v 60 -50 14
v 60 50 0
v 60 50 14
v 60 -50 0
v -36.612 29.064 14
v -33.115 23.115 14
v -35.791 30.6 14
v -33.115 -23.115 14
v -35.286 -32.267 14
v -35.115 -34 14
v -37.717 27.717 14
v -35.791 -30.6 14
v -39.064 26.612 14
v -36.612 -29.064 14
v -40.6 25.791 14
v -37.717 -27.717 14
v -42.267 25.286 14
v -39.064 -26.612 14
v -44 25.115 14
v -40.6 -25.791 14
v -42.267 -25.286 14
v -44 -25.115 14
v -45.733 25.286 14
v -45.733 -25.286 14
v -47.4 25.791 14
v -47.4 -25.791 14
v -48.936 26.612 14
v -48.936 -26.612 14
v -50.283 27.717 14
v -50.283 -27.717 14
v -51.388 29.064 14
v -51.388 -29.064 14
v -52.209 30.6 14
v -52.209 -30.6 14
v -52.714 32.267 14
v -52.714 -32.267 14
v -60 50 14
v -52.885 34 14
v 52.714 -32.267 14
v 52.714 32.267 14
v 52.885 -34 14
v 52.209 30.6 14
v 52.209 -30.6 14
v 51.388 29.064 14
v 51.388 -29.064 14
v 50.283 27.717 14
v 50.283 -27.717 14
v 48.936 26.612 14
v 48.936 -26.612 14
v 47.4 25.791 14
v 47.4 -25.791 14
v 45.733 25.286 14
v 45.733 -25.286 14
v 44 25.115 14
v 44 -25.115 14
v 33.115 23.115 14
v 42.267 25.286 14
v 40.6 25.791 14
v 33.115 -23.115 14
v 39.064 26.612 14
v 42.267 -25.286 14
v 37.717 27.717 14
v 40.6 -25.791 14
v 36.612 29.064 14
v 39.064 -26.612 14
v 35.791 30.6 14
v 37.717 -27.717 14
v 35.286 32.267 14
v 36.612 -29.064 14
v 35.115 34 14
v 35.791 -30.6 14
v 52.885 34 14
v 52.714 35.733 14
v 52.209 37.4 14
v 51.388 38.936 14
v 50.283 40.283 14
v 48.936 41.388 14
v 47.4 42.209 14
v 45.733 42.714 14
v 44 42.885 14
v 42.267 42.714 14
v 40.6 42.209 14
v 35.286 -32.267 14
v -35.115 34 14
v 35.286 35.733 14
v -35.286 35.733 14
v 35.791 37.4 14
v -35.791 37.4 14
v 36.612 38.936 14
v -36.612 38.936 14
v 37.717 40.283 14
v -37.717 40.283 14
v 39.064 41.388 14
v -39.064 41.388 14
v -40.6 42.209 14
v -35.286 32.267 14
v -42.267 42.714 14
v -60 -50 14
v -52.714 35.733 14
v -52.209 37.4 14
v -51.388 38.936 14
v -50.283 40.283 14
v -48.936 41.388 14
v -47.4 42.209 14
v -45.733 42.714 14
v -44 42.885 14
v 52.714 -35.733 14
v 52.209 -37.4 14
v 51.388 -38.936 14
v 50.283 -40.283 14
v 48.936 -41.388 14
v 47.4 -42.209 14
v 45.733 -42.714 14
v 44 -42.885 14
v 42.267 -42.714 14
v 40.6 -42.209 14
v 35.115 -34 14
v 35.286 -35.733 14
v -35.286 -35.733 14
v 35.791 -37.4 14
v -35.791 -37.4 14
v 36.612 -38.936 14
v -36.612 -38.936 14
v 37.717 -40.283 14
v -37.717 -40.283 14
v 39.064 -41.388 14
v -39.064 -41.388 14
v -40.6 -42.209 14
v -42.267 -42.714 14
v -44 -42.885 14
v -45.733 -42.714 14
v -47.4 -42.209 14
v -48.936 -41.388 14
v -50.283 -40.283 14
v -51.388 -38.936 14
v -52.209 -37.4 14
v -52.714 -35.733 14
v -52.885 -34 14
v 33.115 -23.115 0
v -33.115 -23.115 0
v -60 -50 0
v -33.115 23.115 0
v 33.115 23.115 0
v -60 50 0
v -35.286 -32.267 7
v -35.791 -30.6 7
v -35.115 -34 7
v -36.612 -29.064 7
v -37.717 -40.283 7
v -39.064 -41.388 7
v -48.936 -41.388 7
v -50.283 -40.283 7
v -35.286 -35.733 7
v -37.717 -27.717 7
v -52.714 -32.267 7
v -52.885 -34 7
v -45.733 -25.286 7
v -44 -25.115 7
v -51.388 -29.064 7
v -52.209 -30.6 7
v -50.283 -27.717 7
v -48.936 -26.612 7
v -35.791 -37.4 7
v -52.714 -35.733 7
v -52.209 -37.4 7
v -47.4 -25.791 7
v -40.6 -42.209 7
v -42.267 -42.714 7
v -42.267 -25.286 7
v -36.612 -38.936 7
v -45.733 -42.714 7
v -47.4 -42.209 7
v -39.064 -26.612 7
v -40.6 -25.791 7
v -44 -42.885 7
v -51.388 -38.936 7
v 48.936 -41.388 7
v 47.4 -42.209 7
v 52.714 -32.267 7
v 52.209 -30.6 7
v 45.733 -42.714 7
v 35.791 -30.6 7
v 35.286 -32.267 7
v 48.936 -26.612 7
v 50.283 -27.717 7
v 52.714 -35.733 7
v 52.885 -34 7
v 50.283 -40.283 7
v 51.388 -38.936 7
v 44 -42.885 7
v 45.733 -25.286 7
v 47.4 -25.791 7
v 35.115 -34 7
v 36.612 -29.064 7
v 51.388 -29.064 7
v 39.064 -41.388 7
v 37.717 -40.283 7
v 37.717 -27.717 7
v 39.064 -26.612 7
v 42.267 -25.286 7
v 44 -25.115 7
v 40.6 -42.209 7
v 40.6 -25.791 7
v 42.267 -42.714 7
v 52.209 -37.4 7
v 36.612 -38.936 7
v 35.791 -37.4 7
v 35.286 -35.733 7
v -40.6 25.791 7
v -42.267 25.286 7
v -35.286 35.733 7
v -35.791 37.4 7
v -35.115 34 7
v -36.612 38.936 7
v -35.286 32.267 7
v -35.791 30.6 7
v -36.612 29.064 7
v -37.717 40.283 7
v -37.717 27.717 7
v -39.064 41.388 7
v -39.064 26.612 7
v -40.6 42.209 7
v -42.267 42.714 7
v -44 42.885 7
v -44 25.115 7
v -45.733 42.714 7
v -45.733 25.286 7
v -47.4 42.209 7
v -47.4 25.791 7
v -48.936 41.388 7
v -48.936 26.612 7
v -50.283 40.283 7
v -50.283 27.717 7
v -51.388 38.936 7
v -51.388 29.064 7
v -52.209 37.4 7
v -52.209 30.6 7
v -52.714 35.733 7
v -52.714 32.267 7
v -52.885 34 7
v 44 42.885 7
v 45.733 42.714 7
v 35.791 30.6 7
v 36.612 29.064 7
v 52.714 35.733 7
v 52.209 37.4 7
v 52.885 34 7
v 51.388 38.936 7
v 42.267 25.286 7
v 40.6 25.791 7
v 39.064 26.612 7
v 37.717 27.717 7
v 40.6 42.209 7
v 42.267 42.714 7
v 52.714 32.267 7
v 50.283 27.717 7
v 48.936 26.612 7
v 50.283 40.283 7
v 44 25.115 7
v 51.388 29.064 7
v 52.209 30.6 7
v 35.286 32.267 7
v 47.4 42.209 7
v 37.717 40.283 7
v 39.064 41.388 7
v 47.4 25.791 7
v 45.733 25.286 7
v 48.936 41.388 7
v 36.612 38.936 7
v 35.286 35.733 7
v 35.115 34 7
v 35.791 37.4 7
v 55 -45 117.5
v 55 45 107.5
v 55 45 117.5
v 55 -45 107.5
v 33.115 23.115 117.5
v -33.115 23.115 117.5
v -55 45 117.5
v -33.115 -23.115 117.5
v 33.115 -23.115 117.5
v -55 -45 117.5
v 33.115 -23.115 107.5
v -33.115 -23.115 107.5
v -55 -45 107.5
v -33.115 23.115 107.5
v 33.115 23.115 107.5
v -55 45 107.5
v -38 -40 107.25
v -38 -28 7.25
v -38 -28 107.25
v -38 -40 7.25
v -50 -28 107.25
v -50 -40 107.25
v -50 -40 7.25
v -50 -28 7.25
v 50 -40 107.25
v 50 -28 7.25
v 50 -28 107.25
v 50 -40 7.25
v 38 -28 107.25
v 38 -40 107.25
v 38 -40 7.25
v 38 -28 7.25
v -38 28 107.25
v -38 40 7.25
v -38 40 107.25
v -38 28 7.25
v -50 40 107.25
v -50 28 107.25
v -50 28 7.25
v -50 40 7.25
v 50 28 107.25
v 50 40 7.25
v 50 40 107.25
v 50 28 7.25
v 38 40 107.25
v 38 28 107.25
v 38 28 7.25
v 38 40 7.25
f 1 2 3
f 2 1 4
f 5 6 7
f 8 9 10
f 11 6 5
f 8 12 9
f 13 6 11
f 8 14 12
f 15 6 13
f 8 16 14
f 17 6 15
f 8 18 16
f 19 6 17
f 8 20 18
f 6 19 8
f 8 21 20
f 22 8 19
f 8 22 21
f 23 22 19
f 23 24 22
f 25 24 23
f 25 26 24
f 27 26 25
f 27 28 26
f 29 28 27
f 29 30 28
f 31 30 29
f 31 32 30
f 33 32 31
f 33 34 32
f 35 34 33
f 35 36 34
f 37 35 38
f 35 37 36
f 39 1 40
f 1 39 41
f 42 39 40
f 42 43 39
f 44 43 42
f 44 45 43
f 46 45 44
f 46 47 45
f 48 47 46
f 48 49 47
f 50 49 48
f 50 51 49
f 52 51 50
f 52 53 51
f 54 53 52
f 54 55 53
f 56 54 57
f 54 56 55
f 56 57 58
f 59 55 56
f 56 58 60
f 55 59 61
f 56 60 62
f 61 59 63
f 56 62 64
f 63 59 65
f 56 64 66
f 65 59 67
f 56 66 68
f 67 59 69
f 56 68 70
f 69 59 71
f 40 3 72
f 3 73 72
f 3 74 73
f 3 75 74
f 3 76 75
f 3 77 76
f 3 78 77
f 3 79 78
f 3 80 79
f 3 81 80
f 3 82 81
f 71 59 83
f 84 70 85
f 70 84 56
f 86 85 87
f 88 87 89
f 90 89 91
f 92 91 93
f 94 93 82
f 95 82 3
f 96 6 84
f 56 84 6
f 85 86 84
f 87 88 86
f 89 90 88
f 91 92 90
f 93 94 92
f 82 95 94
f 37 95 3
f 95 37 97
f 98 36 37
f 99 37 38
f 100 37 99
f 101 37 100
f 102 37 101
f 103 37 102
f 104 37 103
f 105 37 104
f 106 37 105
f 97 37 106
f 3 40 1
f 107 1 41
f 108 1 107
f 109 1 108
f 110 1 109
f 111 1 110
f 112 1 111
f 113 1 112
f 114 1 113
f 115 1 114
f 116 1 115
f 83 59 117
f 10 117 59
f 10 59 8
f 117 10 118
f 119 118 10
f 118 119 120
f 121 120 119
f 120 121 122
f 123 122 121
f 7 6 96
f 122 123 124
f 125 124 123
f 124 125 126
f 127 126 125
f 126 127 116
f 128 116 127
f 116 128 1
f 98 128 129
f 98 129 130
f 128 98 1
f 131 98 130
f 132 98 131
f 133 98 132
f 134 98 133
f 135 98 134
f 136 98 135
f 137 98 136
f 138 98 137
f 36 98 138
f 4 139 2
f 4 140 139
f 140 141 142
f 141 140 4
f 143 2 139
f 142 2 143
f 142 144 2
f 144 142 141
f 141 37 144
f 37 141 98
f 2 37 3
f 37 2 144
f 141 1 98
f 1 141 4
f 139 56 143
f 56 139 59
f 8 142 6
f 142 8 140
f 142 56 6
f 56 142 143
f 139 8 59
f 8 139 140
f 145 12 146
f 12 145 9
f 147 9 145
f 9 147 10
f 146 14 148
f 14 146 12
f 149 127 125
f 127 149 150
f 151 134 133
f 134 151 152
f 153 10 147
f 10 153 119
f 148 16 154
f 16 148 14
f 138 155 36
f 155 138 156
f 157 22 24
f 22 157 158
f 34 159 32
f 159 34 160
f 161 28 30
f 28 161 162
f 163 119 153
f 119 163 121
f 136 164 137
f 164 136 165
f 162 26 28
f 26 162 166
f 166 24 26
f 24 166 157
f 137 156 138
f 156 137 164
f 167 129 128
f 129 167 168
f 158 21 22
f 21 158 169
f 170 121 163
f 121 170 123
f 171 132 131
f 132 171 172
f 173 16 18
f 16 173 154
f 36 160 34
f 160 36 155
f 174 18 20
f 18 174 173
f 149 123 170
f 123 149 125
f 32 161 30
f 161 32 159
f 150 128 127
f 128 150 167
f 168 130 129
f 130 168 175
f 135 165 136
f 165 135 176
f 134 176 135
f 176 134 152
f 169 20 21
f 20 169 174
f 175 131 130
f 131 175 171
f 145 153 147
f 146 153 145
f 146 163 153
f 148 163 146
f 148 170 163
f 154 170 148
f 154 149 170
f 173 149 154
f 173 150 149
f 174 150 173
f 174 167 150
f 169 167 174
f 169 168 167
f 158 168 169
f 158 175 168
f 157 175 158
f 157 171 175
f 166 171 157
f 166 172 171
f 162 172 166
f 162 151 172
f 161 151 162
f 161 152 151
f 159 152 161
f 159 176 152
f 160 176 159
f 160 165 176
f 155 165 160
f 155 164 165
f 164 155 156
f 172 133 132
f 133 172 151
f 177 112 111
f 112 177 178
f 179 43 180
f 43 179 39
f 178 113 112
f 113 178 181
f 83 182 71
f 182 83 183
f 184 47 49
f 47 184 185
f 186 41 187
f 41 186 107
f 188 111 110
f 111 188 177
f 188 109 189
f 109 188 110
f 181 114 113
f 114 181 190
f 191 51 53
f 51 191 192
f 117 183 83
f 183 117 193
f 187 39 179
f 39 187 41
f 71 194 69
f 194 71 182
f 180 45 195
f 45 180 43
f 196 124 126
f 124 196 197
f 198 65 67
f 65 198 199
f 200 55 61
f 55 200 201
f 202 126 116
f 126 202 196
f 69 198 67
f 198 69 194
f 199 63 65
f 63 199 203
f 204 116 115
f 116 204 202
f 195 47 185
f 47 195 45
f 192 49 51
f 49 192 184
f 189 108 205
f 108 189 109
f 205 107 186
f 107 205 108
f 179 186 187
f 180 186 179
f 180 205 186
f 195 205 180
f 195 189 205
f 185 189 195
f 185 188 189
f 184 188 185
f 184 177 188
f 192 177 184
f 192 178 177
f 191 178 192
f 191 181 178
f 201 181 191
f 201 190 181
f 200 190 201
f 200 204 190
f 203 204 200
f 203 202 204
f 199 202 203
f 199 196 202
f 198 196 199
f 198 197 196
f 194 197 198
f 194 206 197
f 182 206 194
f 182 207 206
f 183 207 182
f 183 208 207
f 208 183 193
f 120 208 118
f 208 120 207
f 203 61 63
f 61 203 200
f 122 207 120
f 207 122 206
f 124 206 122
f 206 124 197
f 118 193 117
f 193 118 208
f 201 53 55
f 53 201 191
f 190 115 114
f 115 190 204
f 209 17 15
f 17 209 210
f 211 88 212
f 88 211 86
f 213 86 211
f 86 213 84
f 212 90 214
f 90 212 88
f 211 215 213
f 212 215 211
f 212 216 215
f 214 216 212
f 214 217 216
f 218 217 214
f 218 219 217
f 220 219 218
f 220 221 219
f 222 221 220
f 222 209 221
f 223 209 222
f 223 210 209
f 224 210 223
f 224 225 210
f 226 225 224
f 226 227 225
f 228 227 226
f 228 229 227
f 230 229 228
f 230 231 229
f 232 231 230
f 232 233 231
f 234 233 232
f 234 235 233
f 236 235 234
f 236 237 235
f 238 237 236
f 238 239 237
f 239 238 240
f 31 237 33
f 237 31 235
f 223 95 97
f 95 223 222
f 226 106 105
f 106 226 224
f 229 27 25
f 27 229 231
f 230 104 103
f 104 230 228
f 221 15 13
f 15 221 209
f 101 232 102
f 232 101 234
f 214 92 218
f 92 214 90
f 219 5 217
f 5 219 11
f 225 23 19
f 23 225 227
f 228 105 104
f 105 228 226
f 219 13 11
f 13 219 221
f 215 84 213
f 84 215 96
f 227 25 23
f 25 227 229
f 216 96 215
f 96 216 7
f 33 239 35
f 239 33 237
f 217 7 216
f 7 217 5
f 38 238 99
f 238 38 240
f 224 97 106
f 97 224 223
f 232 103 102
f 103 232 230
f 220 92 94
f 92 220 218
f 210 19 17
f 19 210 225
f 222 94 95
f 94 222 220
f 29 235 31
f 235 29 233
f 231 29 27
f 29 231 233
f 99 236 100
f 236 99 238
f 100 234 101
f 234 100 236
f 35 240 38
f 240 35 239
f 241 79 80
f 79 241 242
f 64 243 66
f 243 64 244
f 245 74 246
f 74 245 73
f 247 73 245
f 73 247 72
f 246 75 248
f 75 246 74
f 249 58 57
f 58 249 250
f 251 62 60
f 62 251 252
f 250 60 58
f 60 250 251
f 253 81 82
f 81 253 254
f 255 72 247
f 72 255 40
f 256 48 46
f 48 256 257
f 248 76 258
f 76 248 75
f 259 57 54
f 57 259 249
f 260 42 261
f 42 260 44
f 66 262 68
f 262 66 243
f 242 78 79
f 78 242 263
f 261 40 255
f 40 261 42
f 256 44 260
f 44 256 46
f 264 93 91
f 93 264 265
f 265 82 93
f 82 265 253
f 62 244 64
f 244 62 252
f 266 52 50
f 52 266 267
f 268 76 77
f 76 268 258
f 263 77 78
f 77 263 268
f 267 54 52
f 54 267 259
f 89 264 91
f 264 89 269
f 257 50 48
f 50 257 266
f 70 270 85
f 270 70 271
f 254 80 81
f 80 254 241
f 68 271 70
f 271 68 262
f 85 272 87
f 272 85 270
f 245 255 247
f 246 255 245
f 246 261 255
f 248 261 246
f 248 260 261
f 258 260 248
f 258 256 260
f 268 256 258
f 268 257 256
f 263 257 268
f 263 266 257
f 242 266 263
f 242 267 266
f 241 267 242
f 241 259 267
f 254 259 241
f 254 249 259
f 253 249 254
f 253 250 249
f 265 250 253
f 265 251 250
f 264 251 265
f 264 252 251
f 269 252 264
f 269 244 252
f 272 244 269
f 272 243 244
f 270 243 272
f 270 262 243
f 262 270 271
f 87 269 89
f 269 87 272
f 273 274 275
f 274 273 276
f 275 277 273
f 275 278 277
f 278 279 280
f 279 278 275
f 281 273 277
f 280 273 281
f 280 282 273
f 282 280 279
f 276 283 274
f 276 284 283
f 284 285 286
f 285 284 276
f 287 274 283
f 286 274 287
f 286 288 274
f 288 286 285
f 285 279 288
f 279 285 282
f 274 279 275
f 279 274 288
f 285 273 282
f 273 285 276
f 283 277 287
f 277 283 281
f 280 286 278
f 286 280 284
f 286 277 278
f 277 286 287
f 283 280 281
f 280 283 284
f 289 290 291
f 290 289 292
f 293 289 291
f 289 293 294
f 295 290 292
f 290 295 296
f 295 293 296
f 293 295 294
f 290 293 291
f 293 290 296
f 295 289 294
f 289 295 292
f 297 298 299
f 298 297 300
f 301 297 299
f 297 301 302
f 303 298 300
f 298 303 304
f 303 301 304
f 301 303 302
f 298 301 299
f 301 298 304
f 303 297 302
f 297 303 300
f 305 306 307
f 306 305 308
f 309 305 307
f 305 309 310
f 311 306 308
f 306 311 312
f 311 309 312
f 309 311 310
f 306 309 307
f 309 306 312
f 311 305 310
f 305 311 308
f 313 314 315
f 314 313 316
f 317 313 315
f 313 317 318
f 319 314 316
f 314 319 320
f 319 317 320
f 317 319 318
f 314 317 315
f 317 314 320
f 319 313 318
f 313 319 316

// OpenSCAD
$fn = 32;

// ------------------------------------------------------------------------
// Frame cube: base 120 x 100 mm, posts 100 mm tall
// Every part is its own module, assembly() places every instance.
// ------------------------------------------------------------------------

// --- part 1 ---
module base_frame() {
  difference() {
    translate([-60, -50, 0]) cube([120, 100, 14]);
    translate([-33.115, -23.115, -1]) cube([66.23, 46.23, 16]);
    translate([-44, -34, 7]) cylinder(h = 8, d = 17.77);
    translate([44, -34, 7]) cylinder(h = 8, d = 17.77);
    translate([-44, 34, 7]) cylinder(h = 8, d = 17.77);
    translate([44, 34, 7]) cylinder(h = 8, d = 17.77);
  }
}

// --- part 2 ---
module corner_post() {
  translate([-6, -6, 0]) cube([12, 12, 100]);
}

// --- part 3 ---
module top_frame() {
  difference() {
    translate([-55, -45, 0]) cube([110, 90, 10]);
    translate([-33.115, -23.115, -1]) cube([66.23, 46.23, 12]);
  }
}

// --- assembly ---
module assembly() {
  color([0.80, 0.24, 0.20]) translate([0, 0, 0]) rotate([0, 0, 0]) base_frame();
  color([0.20, 0.45, 0.75]) translate([-44, -34, 7.25]) rotate([0, 0, 0]) corner_post();
  color([0.25, 0.62, 0.32]) translate([44, -34, 7.25]) rotate([0, 0, 0]) corner_post();
  color([0.92, 0.70, 0.18]) translate([-44, 34, 7.25]) rotate([0, 0, 0]) corner_post();
  color([0.58, 0.35, 0.70]) translate([44, 34, 7.25]) rotate([0, 0, 0]) corner_post();
  color([0.16, 0.66, 0.66]) translate([0, 0, 107.5]) rotate([0, 0, 0]) top_frame();
}

assembly();
